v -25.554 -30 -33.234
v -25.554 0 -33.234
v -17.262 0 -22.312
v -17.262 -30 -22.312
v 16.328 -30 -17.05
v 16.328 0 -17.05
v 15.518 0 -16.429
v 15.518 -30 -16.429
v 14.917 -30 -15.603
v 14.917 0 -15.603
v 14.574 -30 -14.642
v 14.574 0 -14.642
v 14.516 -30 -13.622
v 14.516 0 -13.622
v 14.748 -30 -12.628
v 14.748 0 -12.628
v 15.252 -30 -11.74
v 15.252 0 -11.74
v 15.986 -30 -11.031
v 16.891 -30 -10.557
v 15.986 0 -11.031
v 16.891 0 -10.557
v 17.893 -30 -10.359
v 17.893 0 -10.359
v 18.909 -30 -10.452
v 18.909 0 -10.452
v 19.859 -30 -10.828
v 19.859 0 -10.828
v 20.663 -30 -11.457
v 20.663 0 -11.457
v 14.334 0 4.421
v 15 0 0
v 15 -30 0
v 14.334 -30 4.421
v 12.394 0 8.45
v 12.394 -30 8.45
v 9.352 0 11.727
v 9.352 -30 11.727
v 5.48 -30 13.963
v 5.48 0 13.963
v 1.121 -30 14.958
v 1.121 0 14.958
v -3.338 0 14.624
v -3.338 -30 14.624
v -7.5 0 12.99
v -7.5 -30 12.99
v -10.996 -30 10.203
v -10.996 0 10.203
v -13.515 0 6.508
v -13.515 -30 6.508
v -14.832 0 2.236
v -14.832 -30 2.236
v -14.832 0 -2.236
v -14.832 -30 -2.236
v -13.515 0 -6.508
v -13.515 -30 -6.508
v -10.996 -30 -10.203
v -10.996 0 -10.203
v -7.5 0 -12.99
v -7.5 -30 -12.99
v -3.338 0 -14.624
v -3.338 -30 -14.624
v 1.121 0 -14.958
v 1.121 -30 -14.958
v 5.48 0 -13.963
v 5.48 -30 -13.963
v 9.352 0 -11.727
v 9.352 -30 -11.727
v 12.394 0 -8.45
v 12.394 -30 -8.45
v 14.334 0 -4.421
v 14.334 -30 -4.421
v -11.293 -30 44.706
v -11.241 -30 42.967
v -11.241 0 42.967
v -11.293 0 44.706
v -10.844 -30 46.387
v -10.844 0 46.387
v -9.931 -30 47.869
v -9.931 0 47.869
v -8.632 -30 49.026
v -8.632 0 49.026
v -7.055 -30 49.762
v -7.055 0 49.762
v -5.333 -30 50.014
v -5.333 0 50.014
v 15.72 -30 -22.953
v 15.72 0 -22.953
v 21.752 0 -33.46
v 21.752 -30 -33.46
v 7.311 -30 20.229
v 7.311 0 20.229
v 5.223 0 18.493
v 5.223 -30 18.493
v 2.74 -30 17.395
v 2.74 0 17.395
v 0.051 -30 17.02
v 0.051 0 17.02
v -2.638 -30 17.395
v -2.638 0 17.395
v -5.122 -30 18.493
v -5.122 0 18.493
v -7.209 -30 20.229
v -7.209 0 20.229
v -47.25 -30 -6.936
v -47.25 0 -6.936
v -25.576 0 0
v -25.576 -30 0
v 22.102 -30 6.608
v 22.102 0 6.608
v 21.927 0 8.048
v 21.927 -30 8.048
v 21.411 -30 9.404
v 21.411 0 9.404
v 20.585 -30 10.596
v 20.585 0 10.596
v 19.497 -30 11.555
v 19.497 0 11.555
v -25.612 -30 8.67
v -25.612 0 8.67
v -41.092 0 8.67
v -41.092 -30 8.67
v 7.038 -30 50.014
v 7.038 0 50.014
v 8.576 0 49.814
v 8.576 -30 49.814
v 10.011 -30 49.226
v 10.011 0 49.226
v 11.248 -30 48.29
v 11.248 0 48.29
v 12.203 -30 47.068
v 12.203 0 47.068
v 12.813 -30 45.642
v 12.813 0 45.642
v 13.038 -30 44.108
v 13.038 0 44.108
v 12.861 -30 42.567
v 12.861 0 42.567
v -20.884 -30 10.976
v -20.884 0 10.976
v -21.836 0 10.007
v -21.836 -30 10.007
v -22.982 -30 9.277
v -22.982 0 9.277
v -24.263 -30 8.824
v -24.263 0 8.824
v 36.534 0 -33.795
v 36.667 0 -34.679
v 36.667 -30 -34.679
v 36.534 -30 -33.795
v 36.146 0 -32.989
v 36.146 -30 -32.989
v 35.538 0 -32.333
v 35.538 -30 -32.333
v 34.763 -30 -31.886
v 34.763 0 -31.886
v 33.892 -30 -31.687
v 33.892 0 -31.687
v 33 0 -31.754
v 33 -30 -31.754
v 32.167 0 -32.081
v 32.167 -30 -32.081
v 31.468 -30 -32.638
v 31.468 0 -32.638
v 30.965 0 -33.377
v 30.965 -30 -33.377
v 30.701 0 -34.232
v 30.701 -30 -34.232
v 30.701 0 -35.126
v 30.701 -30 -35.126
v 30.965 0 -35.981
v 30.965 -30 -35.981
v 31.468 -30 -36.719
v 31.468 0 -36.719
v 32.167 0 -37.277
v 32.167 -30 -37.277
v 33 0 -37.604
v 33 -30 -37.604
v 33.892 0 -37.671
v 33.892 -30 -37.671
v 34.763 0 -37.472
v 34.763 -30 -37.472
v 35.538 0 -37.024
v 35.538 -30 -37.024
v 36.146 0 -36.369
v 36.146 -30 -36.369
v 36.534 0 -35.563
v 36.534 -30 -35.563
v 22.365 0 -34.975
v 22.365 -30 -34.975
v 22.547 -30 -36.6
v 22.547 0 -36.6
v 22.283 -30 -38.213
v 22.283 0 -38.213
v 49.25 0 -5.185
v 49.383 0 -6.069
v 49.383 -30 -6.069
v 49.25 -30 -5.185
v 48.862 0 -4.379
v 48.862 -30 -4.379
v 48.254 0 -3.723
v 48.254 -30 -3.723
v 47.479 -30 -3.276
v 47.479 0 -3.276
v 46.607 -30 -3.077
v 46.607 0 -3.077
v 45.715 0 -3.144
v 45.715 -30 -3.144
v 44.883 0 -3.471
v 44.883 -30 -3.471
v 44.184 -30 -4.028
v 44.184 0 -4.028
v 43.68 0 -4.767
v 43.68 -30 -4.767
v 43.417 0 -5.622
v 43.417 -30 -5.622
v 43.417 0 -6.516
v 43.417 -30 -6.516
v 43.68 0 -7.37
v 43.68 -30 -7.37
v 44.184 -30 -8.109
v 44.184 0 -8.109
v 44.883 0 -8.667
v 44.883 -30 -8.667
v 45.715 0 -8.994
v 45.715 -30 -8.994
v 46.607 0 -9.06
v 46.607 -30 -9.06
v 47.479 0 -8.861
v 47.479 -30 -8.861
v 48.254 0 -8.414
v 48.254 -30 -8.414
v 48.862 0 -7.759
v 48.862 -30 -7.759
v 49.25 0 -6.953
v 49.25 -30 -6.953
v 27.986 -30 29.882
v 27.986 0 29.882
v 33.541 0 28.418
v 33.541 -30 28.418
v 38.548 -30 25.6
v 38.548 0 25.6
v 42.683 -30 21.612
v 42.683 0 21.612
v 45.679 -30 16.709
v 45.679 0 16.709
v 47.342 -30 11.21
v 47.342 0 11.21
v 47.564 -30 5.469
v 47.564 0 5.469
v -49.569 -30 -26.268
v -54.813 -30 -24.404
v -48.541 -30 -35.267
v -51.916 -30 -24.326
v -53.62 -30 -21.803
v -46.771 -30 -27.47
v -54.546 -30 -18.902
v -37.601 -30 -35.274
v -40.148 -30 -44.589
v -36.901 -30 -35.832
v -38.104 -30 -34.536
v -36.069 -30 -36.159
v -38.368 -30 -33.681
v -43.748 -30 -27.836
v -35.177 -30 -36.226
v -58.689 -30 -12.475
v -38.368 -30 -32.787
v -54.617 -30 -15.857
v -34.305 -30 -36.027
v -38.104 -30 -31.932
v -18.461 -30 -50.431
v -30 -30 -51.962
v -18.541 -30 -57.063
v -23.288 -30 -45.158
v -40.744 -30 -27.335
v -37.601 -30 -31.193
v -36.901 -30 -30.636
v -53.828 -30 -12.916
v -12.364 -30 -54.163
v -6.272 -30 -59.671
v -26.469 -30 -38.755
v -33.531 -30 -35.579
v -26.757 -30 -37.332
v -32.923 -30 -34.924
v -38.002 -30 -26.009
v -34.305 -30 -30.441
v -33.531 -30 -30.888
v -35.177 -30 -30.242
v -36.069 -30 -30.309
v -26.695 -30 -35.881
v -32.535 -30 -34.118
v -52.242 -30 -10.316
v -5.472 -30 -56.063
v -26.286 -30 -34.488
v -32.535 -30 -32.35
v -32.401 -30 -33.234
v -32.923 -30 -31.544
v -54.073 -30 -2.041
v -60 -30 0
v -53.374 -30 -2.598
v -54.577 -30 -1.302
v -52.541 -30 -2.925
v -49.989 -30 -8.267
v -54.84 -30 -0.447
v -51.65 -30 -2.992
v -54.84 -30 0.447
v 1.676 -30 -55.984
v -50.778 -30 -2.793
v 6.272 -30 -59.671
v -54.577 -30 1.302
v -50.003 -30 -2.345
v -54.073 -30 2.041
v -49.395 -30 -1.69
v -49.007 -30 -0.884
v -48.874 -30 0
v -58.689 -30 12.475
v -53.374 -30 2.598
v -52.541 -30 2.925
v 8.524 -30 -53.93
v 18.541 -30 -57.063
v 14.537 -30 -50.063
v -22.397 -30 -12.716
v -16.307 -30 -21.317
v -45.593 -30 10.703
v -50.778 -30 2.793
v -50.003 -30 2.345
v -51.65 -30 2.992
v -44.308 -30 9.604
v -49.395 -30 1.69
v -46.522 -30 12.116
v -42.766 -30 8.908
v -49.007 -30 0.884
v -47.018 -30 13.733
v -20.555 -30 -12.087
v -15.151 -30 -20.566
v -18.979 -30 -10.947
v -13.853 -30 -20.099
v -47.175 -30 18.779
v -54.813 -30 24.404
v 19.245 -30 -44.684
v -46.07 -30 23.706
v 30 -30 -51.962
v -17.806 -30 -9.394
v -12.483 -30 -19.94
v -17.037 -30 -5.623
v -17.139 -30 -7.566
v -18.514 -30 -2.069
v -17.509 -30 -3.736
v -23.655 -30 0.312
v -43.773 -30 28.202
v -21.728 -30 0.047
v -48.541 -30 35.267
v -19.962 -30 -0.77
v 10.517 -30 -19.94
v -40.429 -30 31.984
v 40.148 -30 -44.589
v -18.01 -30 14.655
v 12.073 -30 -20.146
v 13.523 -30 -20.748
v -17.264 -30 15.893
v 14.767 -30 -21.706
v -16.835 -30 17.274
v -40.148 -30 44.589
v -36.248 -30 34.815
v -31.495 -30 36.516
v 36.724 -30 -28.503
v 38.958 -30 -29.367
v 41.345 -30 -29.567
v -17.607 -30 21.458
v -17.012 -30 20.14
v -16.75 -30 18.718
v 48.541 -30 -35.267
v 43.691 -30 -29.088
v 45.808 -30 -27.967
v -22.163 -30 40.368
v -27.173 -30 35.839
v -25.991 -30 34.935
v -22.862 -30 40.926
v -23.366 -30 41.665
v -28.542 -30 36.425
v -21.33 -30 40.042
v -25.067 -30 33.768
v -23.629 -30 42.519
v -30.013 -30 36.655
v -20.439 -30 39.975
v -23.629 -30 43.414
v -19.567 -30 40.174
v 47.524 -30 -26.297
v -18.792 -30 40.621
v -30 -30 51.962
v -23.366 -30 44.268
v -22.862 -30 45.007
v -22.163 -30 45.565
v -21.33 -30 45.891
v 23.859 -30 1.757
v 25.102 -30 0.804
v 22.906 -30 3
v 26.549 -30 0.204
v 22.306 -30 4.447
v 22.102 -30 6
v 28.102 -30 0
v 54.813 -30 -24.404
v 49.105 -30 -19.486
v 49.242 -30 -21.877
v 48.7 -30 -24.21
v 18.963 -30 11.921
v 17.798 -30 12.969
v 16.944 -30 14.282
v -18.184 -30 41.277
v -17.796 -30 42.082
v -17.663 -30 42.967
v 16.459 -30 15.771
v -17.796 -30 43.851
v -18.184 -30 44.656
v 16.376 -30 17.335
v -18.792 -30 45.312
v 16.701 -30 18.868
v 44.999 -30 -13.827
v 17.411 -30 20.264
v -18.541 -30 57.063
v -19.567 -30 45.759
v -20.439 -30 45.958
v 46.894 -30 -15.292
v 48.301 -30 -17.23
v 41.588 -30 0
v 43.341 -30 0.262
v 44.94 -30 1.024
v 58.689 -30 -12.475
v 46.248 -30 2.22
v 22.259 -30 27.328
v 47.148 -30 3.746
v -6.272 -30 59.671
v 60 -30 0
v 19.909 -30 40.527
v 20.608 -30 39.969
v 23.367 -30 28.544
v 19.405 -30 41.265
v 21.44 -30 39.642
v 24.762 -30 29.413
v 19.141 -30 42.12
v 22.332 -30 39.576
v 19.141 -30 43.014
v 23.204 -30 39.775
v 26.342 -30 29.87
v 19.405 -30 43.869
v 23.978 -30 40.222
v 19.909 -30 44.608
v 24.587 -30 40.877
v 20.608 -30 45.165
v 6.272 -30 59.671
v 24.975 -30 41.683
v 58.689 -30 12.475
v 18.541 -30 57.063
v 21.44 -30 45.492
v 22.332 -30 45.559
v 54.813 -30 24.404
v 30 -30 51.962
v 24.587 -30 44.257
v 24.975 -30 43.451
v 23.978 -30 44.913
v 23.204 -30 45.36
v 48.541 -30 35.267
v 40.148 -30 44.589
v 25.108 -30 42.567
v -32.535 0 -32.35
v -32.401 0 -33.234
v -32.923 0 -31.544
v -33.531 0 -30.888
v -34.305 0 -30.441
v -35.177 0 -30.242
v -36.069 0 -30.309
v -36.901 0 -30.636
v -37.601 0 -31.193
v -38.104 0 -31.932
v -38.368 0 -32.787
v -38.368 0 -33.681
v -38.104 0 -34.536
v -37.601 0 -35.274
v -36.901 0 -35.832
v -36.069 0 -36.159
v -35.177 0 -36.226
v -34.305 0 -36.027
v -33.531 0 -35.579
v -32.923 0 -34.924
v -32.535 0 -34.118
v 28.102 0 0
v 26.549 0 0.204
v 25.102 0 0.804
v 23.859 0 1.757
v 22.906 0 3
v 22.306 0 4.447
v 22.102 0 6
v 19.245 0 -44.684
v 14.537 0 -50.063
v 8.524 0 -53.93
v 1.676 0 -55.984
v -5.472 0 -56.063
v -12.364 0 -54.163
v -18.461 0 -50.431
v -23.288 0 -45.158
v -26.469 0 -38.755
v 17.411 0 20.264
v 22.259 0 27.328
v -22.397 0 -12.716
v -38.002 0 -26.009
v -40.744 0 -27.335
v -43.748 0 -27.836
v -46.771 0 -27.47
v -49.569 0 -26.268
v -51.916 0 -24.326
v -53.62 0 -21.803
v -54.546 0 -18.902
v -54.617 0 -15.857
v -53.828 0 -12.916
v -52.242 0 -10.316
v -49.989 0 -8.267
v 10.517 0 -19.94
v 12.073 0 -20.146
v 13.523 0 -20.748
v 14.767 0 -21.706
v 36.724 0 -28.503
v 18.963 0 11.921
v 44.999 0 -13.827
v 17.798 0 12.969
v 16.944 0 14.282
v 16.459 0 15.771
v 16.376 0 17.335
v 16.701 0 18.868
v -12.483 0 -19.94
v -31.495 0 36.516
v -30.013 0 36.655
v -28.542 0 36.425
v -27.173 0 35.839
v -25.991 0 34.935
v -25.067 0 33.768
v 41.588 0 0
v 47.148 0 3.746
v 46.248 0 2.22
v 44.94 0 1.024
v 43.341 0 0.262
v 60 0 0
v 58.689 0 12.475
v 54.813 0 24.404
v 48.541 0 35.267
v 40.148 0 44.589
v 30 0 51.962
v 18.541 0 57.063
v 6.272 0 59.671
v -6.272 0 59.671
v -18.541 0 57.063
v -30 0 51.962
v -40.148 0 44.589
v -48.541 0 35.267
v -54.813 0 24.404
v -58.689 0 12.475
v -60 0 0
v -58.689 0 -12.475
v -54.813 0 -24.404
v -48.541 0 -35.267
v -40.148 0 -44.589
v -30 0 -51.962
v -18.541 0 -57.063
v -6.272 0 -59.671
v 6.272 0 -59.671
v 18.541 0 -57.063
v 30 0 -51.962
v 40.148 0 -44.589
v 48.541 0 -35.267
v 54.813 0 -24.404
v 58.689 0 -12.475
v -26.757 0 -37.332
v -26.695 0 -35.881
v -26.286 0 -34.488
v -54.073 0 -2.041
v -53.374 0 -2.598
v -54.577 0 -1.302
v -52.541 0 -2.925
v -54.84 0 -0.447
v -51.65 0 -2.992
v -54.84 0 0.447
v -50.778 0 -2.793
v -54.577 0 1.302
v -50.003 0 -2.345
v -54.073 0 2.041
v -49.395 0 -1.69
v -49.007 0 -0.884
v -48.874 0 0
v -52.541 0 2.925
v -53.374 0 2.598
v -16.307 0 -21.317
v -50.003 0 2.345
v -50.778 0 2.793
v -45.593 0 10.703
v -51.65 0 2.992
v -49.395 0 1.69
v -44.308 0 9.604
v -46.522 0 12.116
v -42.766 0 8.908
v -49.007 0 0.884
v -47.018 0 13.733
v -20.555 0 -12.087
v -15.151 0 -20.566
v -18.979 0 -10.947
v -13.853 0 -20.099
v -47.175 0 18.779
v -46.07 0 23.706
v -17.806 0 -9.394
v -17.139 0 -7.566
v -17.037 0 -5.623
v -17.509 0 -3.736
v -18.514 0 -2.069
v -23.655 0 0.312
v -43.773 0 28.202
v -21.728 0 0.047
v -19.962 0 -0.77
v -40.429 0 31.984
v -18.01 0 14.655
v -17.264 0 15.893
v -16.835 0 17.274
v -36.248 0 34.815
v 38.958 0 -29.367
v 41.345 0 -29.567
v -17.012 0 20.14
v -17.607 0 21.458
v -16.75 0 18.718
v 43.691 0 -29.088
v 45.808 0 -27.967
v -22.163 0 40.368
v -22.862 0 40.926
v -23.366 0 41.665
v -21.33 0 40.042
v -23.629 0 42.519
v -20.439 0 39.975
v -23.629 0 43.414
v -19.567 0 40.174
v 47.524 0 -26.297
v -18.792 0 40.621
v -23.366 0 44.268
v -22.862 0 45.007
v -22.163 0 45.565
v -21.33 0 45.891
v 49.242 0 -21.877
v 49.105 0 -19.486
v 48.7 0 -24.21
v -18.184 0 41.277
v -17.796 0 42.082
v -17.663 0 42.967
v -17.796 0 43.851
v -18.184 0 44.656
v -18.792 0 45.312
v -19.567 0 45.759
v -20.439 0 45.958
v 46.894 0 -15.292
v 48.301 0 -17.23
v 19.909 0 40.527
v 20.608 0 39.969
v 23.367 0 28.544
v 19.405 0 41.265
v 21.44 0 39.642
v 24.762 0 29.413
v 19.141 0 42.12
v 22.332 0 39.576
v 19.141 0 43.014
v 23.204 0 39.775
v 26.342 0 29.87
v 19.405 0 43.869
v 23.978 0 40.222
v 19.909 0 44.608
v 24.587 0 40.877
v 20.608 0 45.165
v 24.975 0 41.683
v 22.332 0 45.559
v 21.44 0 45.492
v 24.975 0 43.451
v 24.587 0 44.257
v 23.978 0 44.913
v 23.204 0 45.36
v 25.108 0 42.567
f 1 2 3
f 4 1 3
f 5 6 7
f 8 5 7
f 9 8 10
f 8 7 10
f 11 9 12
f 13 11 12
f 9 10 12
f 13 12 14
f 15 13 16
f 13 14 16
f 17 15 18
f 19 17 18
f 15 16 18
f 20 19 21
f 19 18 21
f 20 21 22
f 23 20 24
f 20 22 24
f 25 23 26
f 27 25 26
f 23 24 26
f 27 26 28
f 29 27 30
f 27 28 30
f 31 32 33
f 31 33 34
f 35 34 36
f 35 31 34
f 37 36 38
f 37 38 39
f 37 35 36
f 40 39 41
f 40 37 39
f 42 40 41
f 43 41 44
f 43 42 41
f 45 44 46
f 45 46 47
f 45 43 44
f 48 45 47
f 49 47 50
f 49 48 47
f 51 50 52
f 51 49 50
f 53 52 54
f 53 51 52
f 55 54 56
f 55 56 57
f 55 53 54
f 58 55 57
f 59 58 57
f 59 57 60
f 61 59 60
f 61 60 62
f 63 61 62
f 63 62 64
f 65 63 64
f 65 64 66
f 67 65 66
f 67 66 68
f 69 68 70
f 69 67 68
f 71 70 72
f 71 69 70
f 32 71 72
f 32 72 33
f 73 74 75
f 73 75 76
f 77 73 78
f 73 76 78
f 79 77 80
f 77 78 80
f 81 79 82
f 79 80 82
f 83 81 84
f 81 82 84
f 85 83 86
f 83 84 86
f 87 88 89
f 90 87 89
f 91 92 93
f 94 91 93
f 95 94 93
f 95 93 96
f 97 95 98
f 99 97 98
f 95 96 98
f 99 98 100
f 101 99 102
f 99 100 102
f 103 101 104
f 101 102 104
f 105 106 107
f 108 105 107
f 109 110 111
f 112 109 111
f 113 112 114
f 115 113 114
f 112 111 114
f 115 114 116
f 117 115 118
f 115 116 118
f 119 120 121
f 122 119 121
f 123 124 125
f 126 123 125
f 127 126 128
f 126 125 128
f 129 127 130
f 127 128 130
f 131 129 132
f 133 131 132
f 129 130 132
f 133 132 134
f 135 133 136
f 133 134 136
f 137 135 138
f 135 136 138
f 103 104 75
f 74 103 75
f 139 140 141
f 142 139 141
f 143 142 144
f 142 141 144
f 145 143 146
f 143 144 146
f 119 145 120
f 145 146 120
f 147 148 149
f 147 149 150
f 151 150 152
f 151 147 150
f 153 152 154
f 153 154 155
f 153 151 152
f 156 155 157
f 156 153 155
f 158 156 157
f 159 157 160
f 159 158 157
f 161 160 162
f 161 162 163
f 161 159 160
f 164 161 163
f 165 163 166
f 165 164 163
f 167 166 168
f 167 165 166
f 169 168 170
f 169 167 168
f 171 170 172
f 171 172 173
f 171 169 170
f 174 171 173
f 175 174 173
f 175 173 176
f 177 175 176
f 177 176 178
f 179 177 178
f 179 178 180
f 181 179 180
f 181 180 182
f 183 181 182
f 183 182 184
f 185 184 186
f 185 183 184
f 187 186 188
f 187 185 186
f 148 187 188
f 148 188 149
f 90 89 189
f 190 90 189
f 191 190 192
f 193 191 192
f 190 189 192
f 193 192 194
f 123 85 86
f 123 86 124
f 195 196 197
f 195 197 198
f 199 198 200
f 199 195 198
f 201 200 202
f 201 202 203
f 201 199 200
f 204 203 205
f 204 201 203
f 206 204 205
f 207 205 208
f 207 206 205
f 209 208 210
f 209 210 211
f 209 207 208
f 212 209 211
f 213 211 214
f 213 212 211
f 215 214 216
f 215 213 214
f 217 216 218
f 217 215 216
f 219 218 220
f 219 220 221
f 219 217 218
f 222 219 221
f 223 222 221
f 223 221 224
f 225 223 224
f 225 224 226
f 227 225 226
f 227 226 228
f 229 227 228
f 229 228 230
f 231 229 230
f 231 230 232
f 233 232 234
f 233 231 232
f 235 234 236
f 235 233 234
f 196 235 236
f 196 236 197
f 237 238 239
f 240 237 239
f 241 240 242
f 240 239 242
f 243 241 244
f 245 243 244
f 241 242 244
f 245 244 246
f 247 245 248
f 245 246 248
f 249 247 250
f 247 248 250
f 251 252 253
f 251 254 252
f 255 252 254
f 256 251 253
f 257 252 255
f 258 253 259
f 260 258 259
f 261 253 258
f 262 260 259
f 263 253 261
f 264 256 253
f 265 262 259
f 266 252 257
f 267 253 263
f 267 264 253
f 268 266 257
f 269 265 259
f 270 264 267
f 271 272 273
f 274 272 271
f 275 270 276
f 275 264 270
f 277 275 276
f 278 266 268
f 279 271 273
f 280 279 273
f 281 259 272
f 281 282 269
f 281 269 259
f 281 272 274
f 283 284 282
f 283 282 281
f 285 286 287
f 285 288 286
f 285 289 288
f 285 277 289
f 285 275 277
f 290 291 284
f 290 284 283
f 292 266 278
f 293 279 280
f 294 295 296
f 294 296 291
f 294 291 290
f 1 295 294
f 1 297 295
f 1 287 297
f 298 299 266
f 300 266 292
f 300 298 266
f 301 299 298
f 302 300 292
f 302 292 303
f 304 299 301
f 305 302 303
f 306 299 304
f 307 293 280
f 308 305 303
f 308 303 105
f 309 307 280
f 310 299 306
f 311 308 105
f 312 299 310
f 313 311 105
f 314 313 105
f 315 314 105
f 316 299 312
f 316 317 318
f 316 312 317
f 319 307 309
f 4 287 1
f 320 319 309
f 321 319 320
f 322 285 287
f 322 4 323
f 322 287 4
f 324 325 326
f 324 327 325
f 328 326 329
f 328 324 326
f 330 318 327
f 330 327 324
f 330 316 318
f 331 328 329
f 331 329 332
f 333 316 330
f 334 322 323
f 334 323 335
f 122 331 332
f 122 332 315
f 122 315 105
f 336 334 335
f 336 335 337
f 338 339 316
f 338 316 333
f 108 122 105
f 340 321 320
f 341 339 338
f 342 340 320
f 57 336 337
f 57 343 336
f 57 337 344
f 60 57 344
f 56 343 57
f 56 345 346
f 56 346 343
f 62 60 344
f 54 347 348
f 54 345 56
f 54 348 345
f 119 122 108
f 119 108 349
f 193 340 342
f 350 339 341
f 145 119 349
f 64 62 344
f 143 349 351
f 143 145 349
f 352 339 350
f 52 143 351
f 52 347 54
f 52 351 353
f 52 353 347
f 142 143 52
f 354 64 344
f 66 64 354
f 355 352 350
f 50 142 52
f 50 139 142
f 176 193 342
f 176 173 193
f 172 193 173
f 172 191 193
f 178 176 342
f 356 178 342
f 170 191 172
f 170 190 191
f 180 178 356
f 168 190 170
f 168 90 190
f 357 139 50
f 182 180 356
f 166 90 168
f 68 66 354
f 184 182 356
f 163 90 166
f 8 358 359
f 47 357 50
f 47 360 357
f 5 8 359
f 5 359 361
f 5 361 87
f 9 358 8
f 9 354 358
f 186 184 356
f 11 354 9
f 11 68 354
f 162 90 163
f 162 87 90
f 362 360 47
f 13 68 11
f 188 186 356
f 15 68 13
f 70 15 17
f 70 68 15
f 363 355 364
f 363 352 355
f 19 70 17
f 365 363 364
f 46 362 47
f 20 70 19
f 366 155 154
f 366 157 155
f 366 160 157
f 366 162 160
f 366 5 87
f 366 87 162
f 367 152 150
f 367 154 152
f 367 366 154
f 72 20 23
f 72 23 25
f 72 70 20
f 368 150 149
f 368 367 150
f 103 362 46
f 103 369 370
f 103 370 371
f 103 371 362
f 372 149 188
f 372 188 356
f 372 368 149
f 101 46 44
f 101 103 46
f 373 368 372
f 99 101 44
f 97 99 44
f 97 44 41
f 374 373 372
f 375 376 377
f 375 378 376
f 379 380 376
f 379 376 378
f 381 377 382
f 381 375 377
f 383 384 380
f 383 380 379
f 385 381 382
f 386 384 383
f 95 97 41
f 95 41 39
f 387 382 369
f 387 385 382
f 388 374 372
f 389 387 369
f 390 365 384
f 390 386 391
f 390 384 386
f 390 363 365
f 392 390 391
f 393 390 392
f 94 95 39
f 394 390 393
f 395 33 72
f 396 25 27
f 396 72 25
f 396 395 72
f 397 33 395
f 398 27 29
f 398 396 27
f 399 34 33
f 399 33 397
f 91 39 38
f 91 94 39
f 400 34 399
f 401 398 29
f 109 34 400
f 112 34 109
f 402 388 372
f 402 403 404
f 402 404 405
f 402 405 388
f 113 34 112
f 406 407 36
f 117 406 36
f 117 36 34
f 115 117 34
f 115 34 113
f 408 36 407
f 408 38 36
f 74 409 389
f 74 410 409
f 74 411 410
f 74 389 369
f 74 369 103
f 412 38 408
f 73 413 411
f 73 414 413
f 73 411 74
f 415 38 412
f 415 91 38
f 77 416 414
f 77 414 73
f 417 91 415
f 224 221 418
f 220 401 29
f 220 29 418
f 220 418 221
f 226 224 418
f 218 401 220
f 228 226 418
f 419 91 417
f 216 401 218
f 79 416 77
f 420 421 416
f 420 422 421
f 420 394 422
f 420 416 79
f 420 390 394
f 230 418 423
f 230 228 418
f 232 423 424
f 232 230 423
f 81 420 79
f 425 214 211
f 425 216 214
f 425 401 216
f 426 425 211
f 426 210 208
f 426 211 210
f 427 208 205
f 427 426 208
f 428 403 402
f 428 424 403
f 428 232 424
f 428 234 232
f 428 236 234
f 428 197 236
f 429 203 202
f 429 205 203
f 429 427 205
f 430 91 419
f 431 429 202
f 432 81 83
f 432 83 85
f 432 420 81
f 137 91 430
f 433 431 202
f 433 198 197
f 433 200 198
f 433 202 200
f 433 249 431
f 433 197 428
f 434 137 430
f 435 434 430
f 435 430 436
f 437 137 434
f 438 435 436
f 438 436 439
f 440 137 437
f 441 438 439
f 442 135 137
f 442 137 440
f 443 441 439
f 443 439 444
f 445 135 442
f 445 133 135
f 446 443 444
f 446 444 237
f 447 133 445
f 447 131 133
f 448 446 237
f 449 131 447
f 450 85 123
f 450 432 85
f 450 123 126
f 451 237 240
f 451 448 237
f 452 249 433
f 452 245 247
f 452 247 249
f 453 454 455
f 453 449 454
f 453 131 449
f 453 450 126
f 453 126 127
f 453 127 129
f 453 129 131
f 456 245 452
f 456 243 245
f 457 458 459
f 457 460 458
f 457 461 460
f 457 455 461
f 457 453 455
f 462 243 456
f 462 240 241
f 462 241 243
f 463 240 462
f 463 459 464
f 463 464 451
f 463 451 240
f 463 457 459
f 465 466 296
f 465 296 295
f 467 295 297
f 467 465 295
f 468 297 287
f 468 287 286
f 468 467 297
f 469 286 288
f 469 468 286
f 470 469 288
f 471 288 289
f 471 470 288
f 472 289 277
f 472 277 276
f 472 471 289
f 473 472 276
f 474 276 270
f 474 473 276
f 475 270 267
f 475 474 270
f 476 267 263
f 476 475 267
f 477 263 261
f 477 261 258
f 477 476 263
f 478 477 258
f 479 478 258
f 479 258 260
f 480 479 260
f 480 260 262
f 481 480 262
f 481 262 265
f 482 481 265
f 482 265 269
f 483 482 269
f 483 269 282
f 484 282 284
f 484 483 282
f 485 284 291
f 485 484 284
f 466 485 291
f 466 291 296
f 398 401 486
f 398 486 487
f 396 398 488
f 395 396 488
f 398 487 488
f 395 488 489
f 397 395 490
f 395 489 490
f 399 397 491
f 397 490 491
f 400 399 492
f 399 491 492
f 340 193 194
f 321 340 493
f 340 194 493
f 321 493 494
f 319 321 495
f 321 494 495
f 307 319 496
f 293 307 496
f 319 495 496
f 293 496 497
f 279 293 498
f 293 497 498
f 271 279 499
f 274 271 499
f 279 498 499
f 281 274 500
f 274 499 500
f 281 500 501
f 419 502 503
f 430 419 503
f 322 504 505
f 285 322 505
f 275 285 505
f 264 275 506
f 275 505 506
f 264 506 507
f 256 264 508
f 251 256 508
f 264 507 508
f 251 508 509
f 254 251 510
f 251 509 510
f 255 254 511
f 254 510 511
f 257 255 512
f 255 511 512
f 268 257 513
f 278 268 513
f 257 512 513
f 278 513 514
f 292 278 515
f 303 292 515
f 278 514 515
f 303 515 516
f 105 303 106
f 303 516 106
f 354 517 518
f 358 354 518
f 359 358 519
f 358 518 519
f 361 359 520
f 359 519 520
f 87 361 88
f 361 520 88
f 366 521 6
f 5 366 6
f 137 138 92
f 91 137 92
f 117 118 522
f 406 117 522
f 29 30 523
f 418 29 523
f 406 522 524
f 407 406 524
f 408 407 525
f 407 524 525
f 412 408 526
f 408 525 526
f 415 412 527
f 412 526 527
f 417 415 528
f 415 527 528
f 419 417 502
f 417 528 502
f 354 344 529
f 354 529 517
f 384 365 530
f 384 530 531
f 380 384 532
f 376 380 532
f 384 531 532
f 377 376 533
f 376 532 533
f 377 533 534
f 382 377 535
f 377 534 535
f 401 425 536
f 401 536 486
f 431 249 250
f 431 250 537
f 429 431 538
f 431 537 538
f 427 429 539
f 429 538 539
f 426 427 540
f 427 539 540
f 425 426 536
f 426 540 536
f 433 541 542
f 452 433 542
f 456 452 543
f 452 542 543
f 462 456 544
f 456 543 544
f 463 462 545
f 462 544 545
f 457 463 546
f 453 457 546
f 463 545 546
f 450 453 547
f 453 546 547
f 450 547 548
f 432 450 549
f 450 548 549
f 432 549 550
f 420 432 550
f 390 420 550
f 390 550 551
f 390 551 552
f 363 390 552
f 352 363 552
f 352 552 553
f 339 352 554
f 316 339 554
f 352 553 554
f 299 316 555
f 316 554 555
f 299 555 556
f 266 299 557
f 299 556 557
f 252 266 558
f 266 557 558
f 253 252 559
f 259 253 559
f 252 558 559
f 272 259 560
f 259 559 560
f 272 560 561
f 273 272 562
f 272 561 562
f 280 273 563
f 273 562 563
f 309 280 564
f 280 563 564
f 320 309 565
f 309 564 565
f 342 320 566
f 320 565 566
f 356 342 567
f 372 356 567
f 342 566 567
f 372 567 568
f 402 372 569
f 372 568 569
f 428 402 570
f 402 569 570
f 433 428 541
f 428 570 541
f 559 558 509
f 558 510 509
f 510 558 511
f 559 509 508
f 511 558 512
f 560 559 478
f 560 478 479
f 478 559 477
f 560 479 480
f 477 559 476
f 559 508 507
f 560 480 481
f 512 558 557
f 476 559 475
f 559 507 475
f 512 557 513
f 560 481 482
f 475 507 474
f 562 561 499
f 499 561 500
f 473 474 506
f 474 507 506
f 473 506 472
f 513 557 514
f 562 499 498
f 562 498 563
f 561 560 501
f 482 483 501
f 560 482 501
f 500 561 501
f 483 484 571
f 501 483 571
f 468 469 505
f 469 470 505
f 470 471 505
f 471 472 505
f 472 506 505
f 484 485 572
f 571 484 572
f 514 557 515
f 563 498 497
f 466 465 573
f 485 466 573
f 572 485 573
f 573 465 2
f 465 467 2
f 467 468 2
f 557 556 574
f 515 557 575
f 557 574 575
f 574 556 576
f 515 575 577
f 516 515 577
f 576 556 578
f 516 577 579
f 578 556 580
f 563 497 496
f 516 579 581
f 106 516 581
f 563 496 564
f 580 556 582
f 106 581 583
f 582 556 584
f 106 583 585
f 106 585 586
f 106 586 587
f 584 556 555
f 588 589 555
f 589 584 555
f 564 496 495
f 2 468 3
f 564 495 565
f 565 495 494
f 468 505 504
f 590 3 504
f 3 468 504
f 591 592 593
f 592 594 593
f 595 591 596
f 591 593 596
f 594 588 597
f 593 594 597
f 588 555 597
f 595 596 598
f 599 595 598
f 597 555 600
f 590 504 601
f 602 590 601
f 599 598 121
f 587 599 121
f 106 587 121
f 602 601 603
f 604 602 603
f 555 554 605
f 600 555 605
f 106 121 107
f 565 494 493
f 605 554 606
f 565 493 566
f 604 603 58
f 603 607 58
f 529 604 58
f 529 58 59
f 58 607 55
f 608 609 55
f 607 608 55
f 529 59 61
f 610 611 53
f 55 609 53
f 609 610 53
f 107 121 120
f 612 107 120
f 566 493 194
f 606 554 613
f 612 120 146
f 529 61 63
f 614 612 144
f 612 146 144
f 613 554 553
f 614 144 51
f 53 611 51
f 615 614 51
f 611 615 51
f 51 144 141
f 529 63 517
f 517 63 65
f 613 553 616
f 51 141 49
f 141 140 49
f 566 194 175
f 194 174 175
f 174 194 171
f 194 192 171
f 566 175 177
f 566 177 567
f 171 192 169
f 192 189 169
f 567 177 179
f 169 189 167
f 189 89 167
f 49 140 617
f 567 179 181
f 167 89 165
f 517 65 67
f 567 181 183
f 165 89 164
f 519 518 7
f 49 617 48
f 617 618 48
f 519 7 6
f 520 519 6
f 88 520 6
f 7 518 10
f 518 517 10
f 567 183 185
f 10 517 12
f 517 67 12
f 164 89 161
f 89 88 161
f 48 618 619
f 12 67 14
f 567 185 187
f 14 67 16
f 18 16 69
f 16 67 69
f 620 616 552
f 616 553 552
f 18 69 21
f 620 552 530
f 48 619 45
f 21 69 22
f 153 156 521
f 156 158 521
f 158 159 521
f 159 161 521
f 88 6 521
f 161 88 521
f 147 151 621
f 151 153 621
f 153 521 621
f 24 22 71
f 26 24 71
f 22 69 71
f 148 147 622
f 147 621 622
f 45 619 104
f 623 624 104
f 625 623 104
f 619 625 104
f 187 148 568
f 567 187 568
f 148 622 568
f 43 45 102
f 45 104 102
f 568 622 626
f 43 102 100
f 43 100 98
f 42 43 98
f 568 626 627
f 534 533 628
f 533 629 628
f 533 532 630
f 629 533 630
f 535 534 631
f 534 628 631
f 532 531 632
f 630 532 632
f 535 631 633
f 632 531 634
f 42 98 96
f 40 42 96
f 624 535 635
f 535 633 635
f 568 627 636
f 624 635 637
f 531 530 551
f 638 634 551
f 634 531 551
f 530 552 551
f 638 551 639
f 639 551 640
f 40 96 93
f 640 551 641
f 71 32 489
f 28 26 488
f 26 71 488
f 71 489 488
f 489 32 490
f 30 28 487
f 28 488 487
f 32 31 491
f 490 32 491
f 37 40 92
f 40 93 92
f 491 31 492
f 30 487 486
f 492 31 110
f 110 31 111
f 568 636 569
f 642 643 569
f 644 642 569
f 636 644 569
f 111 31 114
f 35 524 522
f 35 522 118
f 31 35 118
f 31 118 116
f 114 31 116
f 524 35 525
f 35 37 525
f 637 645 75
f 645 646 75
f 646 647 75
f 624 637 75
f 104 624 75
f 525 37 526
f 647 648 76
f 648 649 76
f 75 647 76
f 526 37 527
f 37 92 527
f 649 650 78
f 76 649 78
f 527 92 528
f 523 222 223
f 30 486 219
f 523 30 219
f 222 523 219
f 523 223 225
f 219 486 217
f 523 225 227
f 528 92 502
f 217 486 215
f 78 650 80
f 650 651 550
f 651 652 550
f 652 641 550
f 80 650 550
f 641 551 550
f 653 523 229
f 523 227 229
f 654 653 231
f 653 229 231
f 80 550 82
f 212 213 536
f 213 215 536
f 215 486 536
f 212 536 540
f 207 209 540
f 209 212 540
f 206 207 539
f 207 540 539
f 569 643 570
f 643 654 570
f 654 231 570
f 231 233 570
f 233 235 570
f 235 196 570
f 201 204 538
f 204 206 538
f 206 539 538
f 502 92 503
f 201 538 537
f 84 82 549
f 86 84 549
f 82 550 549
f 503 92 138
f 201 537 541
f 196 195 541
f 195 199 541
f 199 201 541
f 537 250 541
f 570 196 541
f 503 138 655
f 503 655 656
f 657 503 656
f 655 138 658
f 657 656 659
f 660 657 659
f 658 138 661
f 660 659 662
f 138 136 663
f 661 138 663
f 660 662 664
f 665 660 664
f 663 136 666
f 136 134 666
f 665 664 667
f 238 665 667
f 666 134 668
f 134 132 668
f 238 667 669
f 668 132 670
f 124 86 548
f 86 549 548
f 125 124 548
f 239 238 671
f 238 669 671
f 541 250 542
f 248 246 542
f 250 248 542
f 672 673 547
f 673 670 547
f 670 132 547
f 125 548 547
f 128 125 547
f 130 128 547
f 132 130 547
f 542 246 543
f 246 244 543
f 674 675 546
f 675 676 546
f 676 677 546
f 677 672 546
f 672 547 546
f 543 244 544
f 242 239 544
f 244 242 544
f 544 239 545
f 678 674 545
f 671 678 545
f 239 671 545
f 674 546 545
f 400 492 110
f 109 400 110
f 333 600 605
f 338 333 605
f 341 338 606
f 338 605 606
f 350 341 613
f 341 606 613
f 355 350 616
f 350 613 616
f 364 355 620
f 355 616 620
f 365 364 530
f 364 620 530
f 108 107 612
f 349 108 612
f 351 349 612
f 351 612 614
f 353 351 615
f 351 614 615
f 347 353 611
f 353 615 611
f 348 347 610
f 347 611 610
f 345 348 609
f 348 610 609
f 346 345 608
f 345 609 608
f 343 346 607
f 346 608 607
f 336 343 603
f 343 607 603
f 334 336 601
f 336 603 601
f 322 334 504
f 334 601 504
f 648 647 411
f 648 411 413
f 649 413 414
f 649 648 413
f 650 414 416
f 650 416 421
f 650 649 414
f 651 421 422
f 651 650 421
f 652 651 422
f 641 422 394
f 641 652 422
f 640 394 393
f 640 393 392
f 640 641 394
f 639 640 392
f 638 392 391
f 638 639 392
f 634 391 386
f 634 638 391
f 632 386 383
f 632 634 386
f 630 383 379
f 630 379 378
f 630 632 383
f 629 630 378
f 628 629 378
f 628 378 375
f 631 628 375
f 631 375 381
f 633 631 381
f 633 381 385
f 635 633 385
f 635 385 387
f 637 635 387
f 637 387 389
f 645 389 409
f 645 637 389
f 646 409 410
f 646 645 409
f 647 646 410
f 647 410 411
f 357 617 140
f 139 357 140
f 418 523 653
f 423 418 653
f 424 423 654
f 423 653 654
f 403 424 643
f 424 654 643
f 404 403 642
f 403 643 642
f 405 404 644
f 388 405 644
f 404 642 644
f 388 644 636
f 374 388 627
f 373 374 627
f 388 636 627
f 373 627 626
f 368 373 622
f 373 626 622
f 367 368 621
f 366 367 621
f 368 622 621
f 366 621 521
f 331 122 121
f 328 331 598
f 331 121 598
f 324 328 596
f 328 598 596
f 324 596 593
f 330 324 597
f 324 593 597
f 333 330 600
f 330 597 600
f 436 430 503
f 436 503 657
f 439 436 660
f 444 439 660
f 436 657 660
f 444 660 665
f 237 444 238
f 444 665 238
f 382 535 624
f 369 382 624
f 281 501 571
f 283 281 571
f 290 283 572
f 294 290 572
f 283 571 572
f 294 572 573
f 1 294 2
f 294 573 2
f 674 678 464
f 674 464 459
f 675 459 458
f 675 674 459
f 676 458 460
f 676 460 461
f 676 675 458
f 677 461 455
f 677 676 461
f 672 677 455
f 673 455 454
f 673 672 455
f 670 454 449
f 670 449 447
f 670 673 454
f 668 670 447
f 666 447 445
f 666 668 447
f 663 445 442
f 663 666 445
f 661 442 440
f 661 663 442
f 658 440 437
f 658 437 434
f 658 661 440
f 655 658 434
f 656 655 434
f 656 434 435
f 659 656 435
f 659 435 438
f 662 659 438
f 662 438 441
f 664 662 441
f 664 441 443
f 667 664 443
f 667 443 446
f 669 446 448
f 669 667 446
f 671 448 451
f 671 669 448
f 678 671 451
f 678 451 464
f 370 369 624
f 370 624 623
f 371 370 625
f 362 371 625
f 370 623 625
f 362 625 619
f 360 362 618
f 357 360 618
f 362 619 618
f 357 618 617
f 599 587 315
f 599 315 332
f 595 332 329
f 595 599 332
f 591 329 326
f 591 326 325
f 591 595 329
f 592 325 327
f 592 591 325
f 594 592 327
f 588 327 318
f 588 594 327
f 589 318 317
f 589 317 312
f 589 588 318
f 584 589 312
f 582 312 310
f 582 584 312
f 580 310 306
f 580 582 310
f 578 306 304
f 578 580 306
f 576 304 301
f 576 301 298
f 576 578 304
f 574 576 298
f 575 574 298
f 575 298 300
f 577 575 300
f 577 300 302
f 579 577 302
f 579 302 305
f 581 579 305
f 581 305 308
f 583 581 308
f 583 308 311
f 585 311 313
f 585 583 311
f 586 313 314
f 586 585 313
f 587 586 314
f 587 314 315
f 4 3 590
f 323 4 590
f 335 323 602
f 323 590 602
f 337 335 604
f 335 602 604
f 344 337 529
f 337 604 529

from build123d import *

# Parameters (mm, degrees)
F0_R     = 60
F0_R_2   = 3
F0_R_3   = 15
F1_DEPTH = 30


with BuildPart() as f1:
    # F0 (on Front) → F1 (new body)
    with BuildSketch(Plane.XZ):
        Circle(F0_R)
        with Locations((-35.401378, -33.233948)):
            Circle(F0_R_2, mode=Mode.SUBTRACT)
        with BuildLine():
            Line((-12.483101, -19.940369), (10.516899, -19.940369))
            ThreePointArc((10.516899, -19.940369), (13.523289, -20.747911), (15.720417, -22.953163))
            Line((15.720417, -22.953163), (21.751998, -33.459784))
            ThreePointArc((21.751998, -33.459784), (22.51142, -35.781151), (22.282739, -38.212853))
            ThreePointArc((22.282739, -38.212853), (-1.895302, -56.274409), (-26.469163, -38.755197))
            ThreePointArc((-26.469163, -38.755197), (-26.694895, -35.88137), (-25.554285, -33.233948))
            Line((-25.554285, -33.233948), (-17.261779, -22.312113))
            ThreePointArc((-17.261779, -22.312113), (-15.150541, -20.565914), (-12.483101, -19.940369))
        make_face(mode=Mode.SUBTRACT)
        with BuildLine():
            ThreePointArc((-25.57569, 0), (-17.203021, -4.661994), (-22.39679, -12.715598))
            Line((-22.39679, -12.715598), (-38.002294, -26.009176))
            ThreePointArc((-38.002294, -26.009176), (-53.620423, -21.803036), (-47.250003, -6.93578))
            Line((-47.250003, -6.93578), (-25.57569, 0))
        make_face(mode=Mode.SUBTRACT)
        with Locations((33.667434, -34.678902)):
            Circle(F0_R_2, mode=Mode.SUBTRACT)
        with BuildLine():
            ThreePointArc((16.327983, -17.05046), (15.252019, -11.740154), (20.662844, -11.457273))
            Line((20.662844, -11.457273), (44.998671, -13.827356))
            ThreePointArc((44.998671, -13.827356), (48.186477, -25.295435), (36.723992, -28.503295))
            Line((36.723992, -28.503295), (16.327983, -17.05046))
        make_face(mode=Mode.SUBTRACT)
        with Locations((46.383031, -6.068808)):
            Circle(F0_R_2, mode=Mode.SUBTRACT)
        with Locations((-51.873855, 0)):
            Circle(F0_R_2, mode=Mode.SUBTRACT)
        with BuildLine():
            Line((-18.010051, 14.654659), (-20.884113, 10.975861))
            ThreePointArc((-20.884113, 10.975861), (-22.981972, 9.27699), (-25.612258, 8.669726))
            Line((-25.612258, 8.669726), (-41.092021, 8.669726))
            ThreePointArc((-41.092021, 8.669726), (-44.989315, 10.107807), (-47.0184, 13.732693))
            ThreePointArc((-47.0184, 13.732693), (-43.773022, 28.201746), (-31.494693, 36.516107))
            ThreePointArc((-31.494693, 36.516107), (-27.83933, 36.174602), (-25.067187, 33.767627))
            Line((-25.067187, 33.767627), (-17.60701, 21.458334))
            ThreePointArc((-17.60701, 21.458334), (-16.748697, 17.993713), (-18.010051, 14.654659))
        make_face(mode=Mode.SUBTRACT)
        with Locations((-20.662844, 42.966518)):
            Circle(F0_R_2, mode=Mode.SUBTRACT)
        Circle(F0_R_3, mode=Mode.SUBTRACT)
        with BuildLine():
            ThreePointArc((18.963135, 11.921459), (16.459409, 15.771092), (17.41111, 20.263594))
            Line((17.41111, 20.263594), (22.259295, 27.328092))
            ThreePointArc((22.259295, 27.328092), (24.762361, 29.412708), (27.985799, 29.882196))
            ThreePointArc((27.985799, 29.882196), (42.683104, 21.611507), (47.564314, 5.468741))
            ThreePointArc((47.564314, 5.468741), (45.63834, 1.573514), (41.58788, 0))
            Line((41.58788, 0), (28.101831, 0))
            ThreePointArc((28.101831, 0), (23.859191, 1.757359), (22.101831, 6))
            Line((22.101831, 6), (22.101831, 6.608079))
            ThreePointArc((22.101831, 6.608079), (21.410802, 9.403581), (19.496887, 11.555159))
            Line((19.496887, 11.555159), (18.963135, 11.921459))
        make_face(mode=Mode.SUBTRACT)
        with BuildLine():
            Line((12.861297, 42.56715), (7.310784, 20.229358))
            ThreePointArc((7.310784, 20.229358), (0.050757, 17.019958), (-7.209271, 20.229358))
            Line((-7.209271, 20.229358), (-11.240784, 42.966518))
            ThreePointArc((-11.240784, 42.966518), (-9.931036, 47.868572), (-5.332932, 50.014036))
            Line((-5.332932, 50.014036), (7.038366, 50.014036))
            ThreePointArc((7.038366, 50.014036), (11.764957, 47.709891), (12.861297, 42.56715))
        make_face(mode=Mode.SUBTRACT)
        with Locations((22.107799, 42.56715)):
            Circle(F0_R_2, mode=Mode.SUBTRACT)
    extrude(amount=F1_DEPTH)


solid = f1.part
